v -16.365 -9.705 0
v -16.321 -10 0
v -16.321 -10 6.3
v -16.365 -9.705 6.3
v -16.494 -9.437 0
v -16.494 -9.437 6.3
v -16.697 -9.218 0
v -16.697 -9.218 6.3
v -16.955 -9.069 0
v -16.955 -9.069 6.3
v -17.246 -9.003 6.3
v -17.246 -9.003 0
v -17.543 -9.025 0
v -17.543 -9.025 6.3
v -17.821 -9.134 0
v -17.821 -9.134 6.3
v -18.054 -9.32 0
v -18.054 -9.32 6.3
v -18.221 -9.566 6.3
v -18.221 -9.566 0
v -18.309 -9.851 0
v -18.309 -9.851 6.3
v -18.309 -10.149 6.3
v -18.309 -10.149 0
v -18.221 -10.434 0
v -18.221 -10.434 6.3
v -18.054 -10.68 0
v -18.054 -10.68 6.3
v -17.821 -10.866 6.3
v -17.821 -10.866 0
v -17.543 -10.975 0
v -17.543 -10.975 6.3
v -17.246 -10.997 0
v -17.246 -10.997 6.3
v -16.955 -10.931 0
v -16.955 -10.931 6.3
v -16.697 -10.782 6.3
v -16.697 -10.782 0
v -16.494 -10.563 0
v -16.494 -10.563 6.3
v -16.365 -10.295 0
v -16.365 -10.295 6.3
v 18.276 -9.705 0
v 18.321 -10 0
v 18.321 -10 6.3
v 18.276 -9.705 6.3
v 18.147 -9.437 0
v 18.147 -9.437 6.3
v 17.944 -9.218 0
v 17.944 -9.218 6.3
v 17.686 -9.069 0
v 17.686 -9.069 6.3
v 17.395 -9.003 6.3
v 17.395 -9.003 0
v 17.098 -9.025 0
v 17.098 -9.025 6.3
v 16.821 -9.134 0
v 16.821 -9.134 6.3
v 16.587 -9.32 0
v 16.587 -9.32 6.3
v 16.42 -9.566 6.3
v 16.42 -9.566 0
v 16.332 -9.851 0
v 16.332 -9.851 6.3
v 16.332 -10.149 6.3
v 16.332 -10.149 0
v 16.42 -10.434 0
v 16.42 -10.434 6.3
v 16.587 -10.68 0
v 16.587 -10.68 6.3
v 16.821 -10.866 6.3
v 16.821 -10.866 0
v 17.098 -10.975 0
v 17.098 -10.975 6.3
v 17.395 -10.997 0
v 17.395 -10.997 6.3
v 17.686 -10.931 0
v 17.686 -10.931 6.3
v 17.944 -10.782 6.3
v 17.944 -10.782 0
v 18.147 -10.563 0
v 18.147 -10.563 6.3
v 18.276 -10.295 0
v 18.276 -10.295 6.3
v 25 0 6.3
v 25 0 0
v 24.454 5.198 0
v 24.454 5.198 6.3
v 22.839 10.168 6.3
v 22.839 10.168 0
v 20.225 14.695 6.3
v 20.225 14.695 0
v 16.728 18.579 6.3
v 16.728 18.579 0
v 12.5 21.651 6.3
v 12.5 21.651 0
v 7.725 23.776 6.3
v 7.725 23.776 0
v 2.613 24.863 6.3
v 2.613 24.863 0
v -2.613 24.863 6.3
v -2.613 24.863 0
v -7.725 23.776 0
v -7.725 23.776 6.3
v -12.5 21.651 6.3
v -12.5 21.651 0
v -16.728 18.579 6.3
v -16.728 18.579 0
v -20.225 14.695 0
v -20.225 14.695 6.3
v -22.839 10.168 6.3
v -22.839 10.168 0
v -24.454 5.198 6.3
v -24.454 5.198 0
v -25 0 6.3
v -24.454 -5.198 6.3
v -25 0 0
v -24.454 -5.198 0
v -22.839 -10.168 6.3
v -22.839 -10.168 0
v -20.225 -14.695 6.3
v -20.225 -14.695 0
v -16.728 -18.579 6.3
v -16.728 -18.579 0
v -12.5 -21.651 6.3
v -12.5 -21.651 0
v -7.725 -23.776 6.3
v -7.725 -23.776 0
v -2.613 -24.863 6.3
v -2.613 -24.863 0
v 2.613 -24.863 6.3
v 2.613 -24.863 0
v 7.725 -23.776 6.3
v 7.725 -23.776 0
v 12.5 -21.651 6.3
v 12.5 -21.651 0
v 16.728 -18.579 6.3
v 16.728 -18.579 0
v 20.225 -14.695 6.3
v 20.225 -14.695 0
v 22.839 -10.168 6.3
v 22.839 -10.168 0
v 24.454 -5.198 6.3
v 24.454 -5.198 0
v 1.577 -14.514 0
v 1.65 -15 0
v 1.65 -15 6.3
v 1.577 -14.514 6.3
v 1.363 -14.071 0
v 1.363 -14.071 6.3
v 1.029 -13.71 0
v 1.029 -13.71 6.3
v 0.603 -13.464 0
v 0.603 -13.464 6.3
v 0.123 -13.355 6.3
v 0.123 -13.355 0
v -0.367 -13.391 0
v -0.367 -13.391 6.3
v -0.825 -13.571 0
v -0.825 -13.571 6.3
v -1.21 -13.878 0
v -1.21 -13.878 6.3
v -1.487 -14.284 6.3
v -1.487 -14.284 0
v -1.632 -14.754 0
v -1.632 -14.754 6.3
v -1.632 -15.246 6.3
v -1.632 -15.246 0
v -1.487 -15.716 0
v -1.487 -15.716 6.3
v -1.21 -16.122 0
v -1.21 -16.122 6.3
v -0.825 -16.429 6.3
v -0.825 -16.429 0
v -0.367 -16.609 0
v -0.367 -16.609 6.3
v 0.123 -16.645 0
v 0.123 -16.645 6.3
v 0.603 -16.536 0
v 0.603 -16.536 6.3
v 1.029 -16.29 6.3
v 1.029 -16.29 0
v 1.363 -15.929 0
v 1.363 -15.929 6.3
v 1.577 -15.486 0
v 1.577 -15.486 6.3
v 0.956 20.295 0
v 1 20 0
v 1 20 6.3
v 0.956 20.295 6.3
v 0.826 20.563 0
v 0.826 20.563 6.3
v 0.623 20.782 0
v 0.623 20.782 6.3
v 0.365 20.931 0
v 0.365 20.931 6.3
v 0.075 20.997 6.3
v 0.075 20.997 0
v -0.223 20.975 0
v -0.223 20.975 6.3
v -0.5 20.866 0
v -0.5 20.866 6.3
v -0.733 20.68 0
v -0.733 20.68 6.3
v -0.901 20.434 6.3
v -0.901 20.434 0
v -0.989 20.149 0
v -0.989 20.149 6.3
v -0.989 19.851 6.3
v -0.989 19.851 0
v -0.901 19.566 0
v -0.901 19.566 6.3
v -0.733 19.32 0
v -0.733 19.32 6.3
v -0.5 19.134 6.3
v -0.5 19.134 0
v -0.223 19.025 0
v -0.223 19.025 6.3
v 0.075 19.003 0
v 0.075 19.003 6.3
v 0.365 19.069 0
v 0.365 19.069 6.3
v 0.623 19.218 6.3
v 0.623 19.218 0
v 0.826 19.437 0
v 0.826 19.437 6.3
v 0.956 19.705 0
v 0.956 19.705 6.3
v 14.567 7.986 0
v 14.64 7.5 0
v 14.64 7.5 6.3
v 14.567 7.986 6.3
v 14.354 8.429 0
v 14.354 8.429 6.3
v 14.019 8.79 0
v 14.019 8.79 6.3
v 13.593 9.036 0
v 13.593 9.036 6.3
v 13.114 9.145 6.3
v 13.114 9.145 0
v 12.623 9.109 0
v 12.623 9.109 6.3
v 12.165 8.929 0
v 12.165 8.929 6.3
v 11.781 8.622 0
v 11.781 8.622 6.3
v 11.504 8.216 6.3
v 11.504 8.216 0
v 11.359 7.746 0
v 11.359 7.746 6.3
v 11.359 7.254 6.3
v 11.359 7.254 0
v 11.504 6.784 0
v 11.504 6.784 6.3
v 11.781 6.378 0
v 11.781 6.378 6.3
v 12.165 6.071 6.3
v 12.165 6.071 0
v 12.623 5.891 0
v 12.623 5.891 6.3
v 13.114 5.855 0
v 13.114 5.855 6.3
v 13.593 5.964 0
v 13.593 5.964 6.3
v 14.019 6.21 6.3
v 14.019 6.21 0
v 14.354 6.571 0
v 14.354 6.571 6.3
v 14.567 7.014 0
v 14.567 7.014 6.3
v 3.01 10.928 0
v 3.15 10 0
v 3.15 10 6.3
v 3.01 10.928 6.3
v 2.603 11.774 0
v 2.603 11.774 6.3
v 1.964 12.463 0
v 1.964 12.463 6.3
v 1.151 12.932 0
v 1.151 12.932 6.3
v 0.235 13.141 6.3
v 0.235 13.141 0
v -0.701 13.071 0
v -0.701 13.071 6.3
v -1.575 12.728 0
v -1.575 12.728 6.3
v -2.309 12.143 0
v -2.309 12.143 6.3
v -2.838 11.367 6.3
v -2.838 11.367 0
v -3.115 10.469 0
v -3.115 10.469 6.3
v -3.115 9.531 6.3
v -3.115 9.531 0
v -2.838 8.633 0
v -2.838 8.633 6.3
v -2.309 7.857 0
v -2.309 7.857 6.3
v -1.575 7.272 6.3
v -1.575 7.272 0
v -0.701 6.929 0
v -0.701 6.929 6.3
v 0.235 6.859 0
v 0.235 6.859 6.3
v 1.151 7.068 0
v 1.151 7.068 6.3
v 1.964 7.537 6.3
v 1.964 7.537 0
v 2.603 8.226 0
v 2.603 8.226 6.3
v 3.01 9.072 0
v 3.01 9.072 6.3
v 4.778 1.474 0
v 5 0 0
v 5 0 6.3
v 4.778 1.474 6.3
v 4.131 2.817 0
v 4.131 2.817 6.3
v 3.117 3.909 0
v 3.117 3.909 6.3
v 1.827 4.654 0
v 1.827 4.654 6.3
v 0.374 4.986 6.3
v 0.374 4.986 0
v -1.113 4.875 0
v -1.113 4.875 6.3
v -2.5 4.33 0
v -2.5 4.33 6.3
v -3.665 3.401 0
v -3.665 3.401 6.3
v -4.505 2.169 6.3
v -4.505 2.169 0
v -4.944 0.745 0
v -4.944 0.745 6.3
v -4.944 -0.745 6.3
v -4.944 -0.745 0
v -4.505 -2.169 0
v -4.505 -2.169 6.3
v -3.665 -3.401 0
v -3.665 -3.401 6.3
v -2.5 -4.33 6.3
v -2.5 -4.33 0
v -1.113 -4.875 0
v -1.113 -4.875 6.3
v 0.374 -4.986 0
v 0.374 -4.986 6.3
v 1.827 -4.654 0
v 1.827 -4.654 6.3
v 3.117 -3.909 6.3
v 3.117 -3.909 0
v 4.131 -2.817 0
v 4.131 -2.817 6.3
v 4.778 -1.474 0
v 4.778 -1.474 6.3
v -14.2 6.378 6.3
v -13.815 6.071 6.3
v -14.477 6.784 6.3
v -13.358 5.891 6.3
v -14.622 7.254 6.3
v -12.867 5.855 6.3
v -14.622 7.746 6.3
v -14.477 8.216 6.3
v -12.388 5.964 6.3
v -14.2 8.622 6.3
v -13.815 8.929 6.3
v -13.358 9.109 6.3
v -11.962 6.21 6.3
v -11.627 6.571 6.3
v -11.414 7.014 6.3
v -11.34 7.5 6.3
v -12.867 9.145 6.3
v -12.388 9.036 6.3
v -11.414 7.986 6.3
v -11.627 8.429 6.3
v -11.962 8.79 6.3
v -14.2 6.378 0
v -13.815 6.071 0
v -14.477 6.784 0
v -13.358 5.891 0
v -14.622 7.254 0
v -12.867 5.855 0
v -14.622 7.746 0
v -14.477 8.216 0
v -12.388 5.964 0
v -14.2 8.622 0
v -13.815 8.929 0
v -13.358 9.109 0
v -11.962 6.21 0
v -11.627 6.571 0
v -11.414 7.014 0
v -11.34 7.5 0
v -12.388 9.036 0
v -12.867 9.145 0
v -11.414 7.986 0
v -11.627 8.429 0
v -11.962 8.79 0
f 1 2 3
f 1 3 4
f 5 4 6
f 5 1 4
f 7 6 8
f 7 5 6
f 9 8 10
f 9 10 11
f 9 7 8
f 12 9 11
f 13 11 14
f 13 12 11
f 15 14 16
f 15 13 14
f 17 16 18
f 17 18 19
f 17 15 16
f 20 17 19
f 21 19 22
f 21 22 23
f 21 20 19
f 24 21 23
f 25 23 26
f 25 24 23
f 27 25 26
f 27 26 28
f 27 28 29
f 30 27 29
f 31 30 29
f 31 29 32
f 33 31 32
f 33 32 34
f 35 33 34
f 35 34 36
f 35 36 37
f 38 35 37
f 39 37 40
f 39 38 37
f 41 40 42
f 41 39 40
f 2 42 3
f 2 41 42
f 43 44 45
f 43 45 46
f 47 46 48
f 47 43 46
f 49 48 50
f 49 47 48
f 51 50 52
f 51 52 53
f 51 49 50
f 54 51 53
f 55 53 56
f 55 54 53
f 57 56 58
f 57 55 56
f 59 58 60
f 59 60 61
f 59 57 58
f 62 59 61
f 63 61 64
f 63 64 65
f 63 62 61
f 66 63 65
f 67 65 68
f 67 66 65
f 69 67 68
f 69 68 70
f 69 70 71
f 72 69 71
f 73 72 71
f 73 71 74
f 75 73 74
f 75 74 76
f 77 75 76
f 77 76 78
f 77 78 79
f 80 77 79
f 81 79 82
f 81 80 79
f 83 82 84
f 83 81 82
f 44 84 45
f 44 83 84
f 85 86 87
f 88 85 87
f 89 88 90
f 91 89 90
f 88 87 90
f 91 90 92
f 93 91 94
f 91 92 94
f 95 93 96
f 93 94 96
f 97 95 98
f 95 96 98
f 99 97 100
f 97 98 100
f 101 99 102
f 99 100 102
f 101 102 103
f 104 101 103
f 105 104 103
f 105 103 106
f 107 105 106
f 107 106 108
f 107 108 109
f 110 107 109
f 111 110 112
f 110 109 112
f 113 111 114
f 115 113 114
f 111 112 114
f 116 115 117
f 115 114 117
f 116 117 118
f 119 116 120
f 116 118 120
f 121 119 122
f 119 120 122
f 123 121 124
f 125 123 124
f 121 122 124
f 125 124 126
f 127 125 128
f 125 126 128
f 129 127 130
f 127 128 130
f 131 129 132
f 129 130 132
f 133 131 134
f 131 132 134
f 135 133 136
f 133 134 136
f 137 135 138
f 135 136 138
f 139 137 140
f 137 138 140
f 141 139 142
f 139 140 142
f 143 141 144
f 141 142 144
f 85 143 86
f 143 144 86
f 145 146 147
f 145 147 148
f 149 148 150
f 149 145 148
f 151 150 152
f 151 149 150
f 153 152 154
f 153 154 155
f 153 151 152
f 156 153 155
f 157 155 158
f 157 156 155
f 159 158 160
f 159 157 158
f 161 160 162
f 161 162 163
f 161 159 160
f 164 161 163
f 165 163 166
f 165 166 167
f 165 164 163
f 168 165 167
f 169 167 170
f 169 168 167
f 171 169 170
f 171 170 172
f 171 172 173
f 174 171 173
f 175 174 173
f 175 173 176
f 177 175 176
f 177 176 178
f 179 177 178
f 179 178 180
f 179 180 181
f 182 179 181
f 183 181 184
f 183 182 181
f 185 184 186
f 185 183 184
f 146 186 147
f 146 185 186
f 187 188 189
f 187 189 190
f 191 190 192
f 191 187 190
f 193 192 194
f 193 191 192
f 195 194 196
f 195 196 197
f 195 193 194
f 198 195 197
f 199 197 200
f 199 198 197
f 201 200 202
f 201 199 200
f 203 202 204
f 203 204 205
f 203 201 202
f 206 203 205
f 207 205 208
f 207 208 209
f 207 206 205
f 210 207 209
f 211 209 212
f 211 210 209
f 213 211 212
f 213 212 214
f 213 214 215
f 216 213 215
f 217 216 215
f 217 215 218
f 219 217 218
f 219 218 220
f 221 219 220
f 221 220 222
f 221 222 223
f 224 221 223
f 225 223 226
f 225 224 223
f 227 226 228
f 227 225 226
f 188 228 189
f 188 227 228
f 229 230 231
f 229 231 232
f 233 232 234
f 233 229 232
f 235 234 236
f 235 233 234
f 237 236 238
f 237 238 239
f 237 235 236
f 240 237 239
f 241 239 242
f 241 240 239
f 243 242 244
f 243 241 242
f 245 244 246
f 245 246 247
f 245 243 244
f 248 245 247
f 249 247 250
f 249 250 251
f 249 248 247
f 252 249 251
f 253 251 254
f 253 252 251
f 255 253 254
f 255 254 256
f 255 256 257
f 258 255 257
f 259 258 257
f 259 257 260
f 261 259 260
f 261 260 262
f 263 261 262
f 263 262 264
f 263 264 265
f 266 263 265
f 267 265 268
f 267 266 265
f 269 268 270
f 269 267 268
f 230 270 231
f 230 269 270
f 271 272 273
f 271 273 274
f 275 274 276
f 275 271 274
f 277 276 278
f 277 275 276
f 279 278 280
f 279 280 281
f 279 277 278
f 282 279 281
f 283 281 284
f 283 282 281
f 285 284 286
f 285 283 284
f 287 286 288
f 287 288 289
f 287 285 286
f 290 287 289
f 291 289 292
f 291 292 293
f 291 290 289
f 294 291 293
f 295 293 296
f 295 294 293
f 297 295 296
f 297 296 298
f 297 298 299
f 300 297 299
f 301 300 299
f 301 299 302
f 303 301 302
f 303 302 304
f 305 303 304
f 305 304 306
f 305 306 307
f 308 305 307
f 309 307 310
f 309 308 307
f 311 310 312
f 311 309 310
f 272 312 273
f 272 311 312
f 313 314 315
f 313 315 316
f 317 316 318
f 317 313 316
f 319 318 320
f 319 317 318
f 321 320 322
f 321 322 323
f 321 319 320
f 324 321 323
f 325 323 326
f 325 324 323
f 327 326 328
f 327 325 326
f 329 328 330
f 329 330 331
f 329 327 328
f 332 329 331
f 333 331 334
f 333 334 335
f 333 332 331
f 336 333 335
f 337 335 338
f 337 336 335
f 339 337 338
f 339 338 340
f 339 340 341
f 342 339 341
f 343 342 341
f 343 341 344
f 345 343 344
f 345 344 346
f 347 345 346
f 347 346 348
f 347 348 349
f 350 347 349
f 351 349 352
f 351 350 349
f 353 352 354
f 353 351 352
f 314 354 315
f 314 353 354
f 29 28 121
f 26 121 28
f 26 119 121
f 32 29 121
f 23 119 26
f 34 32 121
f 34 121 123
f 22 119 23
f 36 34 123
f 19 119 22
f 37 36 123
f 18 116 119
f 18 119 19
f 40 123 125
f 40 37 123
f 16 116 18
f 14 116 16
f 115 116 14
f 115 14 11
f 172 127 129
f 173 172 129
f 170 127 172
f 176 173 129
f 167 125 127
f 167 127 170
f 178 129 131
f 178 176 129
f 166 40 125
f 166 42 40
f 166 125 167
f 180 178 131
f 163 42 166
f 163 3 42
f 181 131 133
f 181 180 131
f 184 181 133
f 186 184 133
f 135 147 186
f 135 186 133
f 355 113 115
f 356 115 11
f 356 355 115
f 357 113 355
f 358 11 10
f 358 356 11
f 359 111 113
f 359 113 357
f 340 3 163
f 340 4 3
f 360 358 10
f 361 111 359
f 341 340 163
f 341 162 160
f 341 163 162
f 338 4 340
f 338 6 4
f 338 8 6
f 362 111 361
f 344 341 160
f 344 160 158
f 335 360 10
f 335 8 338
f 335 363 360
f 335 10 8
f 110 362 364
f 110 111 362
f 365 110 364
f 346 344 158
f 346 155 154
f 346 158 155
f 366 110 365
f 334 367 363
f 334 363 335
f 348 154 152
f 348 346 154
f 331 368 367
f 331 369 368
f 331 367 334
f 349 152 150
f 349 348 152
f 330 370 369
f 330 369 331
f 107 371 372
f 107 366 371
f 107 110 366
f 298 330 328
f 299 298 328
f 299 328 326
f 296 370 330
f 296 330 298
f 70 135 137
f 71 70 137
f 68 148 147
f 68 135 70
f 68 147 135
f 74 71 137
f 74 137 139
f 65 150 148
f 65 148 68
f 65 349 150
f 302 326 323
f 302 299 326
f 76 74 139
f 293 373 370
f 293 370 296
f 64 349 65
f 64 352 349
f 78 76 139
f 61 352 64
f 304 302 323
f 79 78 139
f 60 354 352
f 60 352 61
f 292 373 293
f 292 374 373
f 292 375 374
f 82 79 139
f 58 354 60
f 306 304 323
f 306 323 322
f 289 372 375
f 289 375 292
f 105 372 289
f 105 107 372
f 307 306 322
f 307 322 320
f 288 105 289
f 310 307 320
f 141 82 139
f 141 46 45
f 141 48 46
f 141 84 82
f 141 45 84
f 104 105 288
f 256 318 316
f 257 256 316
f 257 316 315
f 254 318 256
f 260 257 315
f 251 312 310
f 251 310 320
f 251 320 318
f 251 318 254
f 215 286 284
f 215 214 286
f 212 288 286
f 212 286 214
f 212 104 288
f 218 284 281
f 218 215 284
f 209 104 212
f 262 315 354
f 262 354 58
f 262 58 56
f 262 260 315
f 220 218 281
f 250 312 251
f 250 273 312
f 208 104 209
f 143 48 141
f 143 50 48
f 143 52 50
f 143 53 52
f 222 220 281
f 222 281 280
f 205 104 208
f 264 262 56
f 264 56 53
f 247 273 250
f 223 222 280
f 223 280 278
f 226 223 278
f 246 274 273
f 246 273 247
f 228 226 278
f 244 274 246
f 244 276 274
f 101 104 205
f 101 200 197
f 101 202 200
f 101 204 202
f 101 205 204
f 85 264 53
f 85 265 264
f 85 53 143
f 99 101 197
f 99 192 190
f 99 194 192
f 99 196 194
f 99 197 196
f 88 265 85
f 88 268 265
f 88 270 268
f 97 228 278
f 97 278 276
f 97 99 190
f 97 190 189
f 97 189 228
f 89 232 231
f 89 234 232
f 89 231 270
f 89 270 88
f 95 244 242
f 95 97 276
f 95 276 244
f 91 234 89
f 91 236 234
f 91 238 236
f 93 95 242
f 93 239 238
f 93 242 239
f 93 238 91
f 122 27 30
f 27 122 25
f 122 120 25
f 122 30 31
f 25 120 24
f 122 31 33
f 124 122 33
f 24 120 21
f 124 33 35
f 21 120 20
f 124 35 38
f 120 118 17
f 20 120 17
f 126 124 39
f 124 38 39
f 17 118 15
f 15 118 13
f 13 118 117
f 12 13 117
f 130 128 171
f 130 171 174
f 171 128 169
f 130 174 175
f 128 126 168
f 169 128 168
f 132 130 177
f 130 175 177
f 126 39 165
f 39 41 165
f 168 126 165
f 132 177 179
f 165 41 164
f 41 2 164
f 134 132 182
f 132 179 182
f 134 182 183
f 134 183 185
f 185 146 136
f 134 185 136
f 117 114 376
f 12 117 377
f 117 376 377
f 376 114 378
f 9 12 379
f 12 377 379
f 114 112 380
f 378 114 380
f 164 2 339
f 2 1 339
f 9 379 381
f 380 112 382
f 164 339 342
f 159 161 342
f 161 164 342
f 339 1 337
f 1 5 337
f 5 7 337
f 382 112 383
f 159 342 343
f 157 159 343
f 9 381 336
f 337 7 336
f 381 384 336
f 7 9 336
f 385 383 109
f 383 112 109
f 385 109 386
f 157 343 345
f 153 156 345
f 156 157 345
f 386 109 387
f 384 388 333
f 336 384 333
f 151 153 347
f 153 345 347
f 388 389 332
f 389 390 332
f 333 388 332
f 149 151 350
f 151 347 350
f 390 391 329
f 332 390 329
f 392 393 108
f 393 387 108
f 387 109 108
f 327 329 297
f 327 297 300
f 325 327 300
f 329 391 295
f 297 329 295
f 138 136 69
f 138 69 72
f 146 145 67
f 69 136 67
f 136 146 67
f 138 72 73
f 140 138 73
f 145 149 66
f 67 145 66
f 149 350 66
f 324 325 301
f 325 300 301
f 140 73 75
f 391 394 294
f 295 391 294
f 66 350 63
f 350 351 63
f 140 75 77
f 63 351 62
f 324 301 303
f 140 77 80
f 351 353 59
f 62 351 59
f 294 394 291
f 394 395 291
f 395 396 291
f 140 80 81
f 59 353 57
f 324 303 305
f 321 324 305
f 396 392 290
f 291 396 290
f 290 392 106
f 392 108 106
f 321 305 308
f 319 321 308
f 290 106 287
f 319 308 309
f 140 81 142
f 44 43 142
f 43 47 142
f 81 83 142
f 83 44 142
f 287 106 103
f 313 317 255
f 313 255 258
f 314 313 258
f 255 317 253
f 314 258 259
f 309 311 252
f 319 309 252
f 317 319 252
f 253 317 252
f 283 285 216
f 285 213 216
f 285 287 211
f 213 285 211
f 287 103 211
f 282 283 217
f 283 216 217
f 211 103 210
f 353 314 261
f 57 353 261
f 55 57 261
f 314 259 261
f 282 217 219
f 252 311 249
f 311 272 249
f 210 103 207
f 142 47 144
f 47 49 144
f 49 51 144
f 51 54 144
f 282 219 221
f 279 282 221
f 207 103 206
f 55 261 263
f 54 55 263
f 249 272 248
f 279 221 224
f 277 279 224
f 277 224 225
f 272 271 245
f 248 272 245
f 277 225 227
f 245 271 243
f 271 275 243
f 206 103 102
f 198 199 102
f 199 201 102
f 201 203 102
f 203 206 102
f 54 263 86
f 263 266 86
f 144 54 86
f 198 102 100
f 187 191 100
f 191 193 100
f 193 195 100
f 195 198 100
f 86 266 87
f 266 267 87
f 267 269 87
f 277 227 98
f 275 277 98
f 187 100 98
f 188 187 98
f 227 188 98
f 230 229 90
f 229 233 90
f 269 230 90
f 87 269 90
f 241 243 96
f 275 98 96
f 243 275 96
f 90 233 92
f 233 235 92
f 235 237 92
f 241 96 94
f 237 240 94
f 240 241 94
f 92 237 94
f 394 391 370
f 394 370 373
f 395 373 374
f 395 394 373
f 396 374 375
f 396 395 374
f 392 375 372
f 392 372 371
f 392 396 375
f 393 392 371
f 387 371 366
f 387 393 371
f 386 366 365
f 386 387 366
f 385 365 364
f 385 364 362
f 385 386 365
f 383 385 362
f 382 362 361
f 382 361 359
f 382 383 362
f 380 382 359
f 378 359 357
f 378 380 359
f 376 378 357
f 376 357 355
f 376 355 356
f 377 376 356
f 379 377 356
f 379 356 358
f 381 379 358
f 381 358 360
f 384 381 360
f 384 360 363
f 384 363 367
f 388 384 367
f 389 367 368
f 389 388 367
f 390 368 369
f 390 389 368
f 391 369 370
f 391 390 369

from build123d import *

# Parameters (mm, degrees)
SKETCH1_R           = 25
SKETCH1_R_2         = 5
SKETCH1_R_3         = 1
SKETCH1_R_4         = 3.15
SKETCH1_R_5         = 1.65
BOSS_EXTRUDE1_DEPTH = 6.3


with BuildPart() as part:
    # Sketch1 → Boss-Extrude1 (new body)
    with BuildSketch(Plane.XY):
        Circle(SKETCH1_R)
        Circle(SKETCH1_R_2, mode=Mode.SUBTRACT)
        with Locations((0, 20)):
            Circle(SKETCH1_R_3, mode=Mode.SUBTRACT)
        with Locations((17.320508076, -10)):
            Circle(SKETCH1_R_3, mode=Mode.SUBTRACT)
        with Locations((-17.320508076, -10)):
            Circle(SKETCH1_R_3, mode=Mode.SUBTRACT)
        with Locations((0, 10)):
            Circle(SKETCH1_R_4, mode=Mode.SUBTRACT)
        with Locations((-12.990381057, 7.5)):
            Circle(SKETCH1_R_5, mode=Mode.SUBTRACT)
        with Locations((12.990381057, 7.5)):
            Circle(SKETCH1_R_5, mode=Mode.SUBTRACT)
        with Locations((0, -15)):
            Circle(SKETCH1_R_5, mode=Mode.SUBTRACT)
    extrude(amount=BOSS_EXTRUDE1_DEPTH)


solid = part.part
